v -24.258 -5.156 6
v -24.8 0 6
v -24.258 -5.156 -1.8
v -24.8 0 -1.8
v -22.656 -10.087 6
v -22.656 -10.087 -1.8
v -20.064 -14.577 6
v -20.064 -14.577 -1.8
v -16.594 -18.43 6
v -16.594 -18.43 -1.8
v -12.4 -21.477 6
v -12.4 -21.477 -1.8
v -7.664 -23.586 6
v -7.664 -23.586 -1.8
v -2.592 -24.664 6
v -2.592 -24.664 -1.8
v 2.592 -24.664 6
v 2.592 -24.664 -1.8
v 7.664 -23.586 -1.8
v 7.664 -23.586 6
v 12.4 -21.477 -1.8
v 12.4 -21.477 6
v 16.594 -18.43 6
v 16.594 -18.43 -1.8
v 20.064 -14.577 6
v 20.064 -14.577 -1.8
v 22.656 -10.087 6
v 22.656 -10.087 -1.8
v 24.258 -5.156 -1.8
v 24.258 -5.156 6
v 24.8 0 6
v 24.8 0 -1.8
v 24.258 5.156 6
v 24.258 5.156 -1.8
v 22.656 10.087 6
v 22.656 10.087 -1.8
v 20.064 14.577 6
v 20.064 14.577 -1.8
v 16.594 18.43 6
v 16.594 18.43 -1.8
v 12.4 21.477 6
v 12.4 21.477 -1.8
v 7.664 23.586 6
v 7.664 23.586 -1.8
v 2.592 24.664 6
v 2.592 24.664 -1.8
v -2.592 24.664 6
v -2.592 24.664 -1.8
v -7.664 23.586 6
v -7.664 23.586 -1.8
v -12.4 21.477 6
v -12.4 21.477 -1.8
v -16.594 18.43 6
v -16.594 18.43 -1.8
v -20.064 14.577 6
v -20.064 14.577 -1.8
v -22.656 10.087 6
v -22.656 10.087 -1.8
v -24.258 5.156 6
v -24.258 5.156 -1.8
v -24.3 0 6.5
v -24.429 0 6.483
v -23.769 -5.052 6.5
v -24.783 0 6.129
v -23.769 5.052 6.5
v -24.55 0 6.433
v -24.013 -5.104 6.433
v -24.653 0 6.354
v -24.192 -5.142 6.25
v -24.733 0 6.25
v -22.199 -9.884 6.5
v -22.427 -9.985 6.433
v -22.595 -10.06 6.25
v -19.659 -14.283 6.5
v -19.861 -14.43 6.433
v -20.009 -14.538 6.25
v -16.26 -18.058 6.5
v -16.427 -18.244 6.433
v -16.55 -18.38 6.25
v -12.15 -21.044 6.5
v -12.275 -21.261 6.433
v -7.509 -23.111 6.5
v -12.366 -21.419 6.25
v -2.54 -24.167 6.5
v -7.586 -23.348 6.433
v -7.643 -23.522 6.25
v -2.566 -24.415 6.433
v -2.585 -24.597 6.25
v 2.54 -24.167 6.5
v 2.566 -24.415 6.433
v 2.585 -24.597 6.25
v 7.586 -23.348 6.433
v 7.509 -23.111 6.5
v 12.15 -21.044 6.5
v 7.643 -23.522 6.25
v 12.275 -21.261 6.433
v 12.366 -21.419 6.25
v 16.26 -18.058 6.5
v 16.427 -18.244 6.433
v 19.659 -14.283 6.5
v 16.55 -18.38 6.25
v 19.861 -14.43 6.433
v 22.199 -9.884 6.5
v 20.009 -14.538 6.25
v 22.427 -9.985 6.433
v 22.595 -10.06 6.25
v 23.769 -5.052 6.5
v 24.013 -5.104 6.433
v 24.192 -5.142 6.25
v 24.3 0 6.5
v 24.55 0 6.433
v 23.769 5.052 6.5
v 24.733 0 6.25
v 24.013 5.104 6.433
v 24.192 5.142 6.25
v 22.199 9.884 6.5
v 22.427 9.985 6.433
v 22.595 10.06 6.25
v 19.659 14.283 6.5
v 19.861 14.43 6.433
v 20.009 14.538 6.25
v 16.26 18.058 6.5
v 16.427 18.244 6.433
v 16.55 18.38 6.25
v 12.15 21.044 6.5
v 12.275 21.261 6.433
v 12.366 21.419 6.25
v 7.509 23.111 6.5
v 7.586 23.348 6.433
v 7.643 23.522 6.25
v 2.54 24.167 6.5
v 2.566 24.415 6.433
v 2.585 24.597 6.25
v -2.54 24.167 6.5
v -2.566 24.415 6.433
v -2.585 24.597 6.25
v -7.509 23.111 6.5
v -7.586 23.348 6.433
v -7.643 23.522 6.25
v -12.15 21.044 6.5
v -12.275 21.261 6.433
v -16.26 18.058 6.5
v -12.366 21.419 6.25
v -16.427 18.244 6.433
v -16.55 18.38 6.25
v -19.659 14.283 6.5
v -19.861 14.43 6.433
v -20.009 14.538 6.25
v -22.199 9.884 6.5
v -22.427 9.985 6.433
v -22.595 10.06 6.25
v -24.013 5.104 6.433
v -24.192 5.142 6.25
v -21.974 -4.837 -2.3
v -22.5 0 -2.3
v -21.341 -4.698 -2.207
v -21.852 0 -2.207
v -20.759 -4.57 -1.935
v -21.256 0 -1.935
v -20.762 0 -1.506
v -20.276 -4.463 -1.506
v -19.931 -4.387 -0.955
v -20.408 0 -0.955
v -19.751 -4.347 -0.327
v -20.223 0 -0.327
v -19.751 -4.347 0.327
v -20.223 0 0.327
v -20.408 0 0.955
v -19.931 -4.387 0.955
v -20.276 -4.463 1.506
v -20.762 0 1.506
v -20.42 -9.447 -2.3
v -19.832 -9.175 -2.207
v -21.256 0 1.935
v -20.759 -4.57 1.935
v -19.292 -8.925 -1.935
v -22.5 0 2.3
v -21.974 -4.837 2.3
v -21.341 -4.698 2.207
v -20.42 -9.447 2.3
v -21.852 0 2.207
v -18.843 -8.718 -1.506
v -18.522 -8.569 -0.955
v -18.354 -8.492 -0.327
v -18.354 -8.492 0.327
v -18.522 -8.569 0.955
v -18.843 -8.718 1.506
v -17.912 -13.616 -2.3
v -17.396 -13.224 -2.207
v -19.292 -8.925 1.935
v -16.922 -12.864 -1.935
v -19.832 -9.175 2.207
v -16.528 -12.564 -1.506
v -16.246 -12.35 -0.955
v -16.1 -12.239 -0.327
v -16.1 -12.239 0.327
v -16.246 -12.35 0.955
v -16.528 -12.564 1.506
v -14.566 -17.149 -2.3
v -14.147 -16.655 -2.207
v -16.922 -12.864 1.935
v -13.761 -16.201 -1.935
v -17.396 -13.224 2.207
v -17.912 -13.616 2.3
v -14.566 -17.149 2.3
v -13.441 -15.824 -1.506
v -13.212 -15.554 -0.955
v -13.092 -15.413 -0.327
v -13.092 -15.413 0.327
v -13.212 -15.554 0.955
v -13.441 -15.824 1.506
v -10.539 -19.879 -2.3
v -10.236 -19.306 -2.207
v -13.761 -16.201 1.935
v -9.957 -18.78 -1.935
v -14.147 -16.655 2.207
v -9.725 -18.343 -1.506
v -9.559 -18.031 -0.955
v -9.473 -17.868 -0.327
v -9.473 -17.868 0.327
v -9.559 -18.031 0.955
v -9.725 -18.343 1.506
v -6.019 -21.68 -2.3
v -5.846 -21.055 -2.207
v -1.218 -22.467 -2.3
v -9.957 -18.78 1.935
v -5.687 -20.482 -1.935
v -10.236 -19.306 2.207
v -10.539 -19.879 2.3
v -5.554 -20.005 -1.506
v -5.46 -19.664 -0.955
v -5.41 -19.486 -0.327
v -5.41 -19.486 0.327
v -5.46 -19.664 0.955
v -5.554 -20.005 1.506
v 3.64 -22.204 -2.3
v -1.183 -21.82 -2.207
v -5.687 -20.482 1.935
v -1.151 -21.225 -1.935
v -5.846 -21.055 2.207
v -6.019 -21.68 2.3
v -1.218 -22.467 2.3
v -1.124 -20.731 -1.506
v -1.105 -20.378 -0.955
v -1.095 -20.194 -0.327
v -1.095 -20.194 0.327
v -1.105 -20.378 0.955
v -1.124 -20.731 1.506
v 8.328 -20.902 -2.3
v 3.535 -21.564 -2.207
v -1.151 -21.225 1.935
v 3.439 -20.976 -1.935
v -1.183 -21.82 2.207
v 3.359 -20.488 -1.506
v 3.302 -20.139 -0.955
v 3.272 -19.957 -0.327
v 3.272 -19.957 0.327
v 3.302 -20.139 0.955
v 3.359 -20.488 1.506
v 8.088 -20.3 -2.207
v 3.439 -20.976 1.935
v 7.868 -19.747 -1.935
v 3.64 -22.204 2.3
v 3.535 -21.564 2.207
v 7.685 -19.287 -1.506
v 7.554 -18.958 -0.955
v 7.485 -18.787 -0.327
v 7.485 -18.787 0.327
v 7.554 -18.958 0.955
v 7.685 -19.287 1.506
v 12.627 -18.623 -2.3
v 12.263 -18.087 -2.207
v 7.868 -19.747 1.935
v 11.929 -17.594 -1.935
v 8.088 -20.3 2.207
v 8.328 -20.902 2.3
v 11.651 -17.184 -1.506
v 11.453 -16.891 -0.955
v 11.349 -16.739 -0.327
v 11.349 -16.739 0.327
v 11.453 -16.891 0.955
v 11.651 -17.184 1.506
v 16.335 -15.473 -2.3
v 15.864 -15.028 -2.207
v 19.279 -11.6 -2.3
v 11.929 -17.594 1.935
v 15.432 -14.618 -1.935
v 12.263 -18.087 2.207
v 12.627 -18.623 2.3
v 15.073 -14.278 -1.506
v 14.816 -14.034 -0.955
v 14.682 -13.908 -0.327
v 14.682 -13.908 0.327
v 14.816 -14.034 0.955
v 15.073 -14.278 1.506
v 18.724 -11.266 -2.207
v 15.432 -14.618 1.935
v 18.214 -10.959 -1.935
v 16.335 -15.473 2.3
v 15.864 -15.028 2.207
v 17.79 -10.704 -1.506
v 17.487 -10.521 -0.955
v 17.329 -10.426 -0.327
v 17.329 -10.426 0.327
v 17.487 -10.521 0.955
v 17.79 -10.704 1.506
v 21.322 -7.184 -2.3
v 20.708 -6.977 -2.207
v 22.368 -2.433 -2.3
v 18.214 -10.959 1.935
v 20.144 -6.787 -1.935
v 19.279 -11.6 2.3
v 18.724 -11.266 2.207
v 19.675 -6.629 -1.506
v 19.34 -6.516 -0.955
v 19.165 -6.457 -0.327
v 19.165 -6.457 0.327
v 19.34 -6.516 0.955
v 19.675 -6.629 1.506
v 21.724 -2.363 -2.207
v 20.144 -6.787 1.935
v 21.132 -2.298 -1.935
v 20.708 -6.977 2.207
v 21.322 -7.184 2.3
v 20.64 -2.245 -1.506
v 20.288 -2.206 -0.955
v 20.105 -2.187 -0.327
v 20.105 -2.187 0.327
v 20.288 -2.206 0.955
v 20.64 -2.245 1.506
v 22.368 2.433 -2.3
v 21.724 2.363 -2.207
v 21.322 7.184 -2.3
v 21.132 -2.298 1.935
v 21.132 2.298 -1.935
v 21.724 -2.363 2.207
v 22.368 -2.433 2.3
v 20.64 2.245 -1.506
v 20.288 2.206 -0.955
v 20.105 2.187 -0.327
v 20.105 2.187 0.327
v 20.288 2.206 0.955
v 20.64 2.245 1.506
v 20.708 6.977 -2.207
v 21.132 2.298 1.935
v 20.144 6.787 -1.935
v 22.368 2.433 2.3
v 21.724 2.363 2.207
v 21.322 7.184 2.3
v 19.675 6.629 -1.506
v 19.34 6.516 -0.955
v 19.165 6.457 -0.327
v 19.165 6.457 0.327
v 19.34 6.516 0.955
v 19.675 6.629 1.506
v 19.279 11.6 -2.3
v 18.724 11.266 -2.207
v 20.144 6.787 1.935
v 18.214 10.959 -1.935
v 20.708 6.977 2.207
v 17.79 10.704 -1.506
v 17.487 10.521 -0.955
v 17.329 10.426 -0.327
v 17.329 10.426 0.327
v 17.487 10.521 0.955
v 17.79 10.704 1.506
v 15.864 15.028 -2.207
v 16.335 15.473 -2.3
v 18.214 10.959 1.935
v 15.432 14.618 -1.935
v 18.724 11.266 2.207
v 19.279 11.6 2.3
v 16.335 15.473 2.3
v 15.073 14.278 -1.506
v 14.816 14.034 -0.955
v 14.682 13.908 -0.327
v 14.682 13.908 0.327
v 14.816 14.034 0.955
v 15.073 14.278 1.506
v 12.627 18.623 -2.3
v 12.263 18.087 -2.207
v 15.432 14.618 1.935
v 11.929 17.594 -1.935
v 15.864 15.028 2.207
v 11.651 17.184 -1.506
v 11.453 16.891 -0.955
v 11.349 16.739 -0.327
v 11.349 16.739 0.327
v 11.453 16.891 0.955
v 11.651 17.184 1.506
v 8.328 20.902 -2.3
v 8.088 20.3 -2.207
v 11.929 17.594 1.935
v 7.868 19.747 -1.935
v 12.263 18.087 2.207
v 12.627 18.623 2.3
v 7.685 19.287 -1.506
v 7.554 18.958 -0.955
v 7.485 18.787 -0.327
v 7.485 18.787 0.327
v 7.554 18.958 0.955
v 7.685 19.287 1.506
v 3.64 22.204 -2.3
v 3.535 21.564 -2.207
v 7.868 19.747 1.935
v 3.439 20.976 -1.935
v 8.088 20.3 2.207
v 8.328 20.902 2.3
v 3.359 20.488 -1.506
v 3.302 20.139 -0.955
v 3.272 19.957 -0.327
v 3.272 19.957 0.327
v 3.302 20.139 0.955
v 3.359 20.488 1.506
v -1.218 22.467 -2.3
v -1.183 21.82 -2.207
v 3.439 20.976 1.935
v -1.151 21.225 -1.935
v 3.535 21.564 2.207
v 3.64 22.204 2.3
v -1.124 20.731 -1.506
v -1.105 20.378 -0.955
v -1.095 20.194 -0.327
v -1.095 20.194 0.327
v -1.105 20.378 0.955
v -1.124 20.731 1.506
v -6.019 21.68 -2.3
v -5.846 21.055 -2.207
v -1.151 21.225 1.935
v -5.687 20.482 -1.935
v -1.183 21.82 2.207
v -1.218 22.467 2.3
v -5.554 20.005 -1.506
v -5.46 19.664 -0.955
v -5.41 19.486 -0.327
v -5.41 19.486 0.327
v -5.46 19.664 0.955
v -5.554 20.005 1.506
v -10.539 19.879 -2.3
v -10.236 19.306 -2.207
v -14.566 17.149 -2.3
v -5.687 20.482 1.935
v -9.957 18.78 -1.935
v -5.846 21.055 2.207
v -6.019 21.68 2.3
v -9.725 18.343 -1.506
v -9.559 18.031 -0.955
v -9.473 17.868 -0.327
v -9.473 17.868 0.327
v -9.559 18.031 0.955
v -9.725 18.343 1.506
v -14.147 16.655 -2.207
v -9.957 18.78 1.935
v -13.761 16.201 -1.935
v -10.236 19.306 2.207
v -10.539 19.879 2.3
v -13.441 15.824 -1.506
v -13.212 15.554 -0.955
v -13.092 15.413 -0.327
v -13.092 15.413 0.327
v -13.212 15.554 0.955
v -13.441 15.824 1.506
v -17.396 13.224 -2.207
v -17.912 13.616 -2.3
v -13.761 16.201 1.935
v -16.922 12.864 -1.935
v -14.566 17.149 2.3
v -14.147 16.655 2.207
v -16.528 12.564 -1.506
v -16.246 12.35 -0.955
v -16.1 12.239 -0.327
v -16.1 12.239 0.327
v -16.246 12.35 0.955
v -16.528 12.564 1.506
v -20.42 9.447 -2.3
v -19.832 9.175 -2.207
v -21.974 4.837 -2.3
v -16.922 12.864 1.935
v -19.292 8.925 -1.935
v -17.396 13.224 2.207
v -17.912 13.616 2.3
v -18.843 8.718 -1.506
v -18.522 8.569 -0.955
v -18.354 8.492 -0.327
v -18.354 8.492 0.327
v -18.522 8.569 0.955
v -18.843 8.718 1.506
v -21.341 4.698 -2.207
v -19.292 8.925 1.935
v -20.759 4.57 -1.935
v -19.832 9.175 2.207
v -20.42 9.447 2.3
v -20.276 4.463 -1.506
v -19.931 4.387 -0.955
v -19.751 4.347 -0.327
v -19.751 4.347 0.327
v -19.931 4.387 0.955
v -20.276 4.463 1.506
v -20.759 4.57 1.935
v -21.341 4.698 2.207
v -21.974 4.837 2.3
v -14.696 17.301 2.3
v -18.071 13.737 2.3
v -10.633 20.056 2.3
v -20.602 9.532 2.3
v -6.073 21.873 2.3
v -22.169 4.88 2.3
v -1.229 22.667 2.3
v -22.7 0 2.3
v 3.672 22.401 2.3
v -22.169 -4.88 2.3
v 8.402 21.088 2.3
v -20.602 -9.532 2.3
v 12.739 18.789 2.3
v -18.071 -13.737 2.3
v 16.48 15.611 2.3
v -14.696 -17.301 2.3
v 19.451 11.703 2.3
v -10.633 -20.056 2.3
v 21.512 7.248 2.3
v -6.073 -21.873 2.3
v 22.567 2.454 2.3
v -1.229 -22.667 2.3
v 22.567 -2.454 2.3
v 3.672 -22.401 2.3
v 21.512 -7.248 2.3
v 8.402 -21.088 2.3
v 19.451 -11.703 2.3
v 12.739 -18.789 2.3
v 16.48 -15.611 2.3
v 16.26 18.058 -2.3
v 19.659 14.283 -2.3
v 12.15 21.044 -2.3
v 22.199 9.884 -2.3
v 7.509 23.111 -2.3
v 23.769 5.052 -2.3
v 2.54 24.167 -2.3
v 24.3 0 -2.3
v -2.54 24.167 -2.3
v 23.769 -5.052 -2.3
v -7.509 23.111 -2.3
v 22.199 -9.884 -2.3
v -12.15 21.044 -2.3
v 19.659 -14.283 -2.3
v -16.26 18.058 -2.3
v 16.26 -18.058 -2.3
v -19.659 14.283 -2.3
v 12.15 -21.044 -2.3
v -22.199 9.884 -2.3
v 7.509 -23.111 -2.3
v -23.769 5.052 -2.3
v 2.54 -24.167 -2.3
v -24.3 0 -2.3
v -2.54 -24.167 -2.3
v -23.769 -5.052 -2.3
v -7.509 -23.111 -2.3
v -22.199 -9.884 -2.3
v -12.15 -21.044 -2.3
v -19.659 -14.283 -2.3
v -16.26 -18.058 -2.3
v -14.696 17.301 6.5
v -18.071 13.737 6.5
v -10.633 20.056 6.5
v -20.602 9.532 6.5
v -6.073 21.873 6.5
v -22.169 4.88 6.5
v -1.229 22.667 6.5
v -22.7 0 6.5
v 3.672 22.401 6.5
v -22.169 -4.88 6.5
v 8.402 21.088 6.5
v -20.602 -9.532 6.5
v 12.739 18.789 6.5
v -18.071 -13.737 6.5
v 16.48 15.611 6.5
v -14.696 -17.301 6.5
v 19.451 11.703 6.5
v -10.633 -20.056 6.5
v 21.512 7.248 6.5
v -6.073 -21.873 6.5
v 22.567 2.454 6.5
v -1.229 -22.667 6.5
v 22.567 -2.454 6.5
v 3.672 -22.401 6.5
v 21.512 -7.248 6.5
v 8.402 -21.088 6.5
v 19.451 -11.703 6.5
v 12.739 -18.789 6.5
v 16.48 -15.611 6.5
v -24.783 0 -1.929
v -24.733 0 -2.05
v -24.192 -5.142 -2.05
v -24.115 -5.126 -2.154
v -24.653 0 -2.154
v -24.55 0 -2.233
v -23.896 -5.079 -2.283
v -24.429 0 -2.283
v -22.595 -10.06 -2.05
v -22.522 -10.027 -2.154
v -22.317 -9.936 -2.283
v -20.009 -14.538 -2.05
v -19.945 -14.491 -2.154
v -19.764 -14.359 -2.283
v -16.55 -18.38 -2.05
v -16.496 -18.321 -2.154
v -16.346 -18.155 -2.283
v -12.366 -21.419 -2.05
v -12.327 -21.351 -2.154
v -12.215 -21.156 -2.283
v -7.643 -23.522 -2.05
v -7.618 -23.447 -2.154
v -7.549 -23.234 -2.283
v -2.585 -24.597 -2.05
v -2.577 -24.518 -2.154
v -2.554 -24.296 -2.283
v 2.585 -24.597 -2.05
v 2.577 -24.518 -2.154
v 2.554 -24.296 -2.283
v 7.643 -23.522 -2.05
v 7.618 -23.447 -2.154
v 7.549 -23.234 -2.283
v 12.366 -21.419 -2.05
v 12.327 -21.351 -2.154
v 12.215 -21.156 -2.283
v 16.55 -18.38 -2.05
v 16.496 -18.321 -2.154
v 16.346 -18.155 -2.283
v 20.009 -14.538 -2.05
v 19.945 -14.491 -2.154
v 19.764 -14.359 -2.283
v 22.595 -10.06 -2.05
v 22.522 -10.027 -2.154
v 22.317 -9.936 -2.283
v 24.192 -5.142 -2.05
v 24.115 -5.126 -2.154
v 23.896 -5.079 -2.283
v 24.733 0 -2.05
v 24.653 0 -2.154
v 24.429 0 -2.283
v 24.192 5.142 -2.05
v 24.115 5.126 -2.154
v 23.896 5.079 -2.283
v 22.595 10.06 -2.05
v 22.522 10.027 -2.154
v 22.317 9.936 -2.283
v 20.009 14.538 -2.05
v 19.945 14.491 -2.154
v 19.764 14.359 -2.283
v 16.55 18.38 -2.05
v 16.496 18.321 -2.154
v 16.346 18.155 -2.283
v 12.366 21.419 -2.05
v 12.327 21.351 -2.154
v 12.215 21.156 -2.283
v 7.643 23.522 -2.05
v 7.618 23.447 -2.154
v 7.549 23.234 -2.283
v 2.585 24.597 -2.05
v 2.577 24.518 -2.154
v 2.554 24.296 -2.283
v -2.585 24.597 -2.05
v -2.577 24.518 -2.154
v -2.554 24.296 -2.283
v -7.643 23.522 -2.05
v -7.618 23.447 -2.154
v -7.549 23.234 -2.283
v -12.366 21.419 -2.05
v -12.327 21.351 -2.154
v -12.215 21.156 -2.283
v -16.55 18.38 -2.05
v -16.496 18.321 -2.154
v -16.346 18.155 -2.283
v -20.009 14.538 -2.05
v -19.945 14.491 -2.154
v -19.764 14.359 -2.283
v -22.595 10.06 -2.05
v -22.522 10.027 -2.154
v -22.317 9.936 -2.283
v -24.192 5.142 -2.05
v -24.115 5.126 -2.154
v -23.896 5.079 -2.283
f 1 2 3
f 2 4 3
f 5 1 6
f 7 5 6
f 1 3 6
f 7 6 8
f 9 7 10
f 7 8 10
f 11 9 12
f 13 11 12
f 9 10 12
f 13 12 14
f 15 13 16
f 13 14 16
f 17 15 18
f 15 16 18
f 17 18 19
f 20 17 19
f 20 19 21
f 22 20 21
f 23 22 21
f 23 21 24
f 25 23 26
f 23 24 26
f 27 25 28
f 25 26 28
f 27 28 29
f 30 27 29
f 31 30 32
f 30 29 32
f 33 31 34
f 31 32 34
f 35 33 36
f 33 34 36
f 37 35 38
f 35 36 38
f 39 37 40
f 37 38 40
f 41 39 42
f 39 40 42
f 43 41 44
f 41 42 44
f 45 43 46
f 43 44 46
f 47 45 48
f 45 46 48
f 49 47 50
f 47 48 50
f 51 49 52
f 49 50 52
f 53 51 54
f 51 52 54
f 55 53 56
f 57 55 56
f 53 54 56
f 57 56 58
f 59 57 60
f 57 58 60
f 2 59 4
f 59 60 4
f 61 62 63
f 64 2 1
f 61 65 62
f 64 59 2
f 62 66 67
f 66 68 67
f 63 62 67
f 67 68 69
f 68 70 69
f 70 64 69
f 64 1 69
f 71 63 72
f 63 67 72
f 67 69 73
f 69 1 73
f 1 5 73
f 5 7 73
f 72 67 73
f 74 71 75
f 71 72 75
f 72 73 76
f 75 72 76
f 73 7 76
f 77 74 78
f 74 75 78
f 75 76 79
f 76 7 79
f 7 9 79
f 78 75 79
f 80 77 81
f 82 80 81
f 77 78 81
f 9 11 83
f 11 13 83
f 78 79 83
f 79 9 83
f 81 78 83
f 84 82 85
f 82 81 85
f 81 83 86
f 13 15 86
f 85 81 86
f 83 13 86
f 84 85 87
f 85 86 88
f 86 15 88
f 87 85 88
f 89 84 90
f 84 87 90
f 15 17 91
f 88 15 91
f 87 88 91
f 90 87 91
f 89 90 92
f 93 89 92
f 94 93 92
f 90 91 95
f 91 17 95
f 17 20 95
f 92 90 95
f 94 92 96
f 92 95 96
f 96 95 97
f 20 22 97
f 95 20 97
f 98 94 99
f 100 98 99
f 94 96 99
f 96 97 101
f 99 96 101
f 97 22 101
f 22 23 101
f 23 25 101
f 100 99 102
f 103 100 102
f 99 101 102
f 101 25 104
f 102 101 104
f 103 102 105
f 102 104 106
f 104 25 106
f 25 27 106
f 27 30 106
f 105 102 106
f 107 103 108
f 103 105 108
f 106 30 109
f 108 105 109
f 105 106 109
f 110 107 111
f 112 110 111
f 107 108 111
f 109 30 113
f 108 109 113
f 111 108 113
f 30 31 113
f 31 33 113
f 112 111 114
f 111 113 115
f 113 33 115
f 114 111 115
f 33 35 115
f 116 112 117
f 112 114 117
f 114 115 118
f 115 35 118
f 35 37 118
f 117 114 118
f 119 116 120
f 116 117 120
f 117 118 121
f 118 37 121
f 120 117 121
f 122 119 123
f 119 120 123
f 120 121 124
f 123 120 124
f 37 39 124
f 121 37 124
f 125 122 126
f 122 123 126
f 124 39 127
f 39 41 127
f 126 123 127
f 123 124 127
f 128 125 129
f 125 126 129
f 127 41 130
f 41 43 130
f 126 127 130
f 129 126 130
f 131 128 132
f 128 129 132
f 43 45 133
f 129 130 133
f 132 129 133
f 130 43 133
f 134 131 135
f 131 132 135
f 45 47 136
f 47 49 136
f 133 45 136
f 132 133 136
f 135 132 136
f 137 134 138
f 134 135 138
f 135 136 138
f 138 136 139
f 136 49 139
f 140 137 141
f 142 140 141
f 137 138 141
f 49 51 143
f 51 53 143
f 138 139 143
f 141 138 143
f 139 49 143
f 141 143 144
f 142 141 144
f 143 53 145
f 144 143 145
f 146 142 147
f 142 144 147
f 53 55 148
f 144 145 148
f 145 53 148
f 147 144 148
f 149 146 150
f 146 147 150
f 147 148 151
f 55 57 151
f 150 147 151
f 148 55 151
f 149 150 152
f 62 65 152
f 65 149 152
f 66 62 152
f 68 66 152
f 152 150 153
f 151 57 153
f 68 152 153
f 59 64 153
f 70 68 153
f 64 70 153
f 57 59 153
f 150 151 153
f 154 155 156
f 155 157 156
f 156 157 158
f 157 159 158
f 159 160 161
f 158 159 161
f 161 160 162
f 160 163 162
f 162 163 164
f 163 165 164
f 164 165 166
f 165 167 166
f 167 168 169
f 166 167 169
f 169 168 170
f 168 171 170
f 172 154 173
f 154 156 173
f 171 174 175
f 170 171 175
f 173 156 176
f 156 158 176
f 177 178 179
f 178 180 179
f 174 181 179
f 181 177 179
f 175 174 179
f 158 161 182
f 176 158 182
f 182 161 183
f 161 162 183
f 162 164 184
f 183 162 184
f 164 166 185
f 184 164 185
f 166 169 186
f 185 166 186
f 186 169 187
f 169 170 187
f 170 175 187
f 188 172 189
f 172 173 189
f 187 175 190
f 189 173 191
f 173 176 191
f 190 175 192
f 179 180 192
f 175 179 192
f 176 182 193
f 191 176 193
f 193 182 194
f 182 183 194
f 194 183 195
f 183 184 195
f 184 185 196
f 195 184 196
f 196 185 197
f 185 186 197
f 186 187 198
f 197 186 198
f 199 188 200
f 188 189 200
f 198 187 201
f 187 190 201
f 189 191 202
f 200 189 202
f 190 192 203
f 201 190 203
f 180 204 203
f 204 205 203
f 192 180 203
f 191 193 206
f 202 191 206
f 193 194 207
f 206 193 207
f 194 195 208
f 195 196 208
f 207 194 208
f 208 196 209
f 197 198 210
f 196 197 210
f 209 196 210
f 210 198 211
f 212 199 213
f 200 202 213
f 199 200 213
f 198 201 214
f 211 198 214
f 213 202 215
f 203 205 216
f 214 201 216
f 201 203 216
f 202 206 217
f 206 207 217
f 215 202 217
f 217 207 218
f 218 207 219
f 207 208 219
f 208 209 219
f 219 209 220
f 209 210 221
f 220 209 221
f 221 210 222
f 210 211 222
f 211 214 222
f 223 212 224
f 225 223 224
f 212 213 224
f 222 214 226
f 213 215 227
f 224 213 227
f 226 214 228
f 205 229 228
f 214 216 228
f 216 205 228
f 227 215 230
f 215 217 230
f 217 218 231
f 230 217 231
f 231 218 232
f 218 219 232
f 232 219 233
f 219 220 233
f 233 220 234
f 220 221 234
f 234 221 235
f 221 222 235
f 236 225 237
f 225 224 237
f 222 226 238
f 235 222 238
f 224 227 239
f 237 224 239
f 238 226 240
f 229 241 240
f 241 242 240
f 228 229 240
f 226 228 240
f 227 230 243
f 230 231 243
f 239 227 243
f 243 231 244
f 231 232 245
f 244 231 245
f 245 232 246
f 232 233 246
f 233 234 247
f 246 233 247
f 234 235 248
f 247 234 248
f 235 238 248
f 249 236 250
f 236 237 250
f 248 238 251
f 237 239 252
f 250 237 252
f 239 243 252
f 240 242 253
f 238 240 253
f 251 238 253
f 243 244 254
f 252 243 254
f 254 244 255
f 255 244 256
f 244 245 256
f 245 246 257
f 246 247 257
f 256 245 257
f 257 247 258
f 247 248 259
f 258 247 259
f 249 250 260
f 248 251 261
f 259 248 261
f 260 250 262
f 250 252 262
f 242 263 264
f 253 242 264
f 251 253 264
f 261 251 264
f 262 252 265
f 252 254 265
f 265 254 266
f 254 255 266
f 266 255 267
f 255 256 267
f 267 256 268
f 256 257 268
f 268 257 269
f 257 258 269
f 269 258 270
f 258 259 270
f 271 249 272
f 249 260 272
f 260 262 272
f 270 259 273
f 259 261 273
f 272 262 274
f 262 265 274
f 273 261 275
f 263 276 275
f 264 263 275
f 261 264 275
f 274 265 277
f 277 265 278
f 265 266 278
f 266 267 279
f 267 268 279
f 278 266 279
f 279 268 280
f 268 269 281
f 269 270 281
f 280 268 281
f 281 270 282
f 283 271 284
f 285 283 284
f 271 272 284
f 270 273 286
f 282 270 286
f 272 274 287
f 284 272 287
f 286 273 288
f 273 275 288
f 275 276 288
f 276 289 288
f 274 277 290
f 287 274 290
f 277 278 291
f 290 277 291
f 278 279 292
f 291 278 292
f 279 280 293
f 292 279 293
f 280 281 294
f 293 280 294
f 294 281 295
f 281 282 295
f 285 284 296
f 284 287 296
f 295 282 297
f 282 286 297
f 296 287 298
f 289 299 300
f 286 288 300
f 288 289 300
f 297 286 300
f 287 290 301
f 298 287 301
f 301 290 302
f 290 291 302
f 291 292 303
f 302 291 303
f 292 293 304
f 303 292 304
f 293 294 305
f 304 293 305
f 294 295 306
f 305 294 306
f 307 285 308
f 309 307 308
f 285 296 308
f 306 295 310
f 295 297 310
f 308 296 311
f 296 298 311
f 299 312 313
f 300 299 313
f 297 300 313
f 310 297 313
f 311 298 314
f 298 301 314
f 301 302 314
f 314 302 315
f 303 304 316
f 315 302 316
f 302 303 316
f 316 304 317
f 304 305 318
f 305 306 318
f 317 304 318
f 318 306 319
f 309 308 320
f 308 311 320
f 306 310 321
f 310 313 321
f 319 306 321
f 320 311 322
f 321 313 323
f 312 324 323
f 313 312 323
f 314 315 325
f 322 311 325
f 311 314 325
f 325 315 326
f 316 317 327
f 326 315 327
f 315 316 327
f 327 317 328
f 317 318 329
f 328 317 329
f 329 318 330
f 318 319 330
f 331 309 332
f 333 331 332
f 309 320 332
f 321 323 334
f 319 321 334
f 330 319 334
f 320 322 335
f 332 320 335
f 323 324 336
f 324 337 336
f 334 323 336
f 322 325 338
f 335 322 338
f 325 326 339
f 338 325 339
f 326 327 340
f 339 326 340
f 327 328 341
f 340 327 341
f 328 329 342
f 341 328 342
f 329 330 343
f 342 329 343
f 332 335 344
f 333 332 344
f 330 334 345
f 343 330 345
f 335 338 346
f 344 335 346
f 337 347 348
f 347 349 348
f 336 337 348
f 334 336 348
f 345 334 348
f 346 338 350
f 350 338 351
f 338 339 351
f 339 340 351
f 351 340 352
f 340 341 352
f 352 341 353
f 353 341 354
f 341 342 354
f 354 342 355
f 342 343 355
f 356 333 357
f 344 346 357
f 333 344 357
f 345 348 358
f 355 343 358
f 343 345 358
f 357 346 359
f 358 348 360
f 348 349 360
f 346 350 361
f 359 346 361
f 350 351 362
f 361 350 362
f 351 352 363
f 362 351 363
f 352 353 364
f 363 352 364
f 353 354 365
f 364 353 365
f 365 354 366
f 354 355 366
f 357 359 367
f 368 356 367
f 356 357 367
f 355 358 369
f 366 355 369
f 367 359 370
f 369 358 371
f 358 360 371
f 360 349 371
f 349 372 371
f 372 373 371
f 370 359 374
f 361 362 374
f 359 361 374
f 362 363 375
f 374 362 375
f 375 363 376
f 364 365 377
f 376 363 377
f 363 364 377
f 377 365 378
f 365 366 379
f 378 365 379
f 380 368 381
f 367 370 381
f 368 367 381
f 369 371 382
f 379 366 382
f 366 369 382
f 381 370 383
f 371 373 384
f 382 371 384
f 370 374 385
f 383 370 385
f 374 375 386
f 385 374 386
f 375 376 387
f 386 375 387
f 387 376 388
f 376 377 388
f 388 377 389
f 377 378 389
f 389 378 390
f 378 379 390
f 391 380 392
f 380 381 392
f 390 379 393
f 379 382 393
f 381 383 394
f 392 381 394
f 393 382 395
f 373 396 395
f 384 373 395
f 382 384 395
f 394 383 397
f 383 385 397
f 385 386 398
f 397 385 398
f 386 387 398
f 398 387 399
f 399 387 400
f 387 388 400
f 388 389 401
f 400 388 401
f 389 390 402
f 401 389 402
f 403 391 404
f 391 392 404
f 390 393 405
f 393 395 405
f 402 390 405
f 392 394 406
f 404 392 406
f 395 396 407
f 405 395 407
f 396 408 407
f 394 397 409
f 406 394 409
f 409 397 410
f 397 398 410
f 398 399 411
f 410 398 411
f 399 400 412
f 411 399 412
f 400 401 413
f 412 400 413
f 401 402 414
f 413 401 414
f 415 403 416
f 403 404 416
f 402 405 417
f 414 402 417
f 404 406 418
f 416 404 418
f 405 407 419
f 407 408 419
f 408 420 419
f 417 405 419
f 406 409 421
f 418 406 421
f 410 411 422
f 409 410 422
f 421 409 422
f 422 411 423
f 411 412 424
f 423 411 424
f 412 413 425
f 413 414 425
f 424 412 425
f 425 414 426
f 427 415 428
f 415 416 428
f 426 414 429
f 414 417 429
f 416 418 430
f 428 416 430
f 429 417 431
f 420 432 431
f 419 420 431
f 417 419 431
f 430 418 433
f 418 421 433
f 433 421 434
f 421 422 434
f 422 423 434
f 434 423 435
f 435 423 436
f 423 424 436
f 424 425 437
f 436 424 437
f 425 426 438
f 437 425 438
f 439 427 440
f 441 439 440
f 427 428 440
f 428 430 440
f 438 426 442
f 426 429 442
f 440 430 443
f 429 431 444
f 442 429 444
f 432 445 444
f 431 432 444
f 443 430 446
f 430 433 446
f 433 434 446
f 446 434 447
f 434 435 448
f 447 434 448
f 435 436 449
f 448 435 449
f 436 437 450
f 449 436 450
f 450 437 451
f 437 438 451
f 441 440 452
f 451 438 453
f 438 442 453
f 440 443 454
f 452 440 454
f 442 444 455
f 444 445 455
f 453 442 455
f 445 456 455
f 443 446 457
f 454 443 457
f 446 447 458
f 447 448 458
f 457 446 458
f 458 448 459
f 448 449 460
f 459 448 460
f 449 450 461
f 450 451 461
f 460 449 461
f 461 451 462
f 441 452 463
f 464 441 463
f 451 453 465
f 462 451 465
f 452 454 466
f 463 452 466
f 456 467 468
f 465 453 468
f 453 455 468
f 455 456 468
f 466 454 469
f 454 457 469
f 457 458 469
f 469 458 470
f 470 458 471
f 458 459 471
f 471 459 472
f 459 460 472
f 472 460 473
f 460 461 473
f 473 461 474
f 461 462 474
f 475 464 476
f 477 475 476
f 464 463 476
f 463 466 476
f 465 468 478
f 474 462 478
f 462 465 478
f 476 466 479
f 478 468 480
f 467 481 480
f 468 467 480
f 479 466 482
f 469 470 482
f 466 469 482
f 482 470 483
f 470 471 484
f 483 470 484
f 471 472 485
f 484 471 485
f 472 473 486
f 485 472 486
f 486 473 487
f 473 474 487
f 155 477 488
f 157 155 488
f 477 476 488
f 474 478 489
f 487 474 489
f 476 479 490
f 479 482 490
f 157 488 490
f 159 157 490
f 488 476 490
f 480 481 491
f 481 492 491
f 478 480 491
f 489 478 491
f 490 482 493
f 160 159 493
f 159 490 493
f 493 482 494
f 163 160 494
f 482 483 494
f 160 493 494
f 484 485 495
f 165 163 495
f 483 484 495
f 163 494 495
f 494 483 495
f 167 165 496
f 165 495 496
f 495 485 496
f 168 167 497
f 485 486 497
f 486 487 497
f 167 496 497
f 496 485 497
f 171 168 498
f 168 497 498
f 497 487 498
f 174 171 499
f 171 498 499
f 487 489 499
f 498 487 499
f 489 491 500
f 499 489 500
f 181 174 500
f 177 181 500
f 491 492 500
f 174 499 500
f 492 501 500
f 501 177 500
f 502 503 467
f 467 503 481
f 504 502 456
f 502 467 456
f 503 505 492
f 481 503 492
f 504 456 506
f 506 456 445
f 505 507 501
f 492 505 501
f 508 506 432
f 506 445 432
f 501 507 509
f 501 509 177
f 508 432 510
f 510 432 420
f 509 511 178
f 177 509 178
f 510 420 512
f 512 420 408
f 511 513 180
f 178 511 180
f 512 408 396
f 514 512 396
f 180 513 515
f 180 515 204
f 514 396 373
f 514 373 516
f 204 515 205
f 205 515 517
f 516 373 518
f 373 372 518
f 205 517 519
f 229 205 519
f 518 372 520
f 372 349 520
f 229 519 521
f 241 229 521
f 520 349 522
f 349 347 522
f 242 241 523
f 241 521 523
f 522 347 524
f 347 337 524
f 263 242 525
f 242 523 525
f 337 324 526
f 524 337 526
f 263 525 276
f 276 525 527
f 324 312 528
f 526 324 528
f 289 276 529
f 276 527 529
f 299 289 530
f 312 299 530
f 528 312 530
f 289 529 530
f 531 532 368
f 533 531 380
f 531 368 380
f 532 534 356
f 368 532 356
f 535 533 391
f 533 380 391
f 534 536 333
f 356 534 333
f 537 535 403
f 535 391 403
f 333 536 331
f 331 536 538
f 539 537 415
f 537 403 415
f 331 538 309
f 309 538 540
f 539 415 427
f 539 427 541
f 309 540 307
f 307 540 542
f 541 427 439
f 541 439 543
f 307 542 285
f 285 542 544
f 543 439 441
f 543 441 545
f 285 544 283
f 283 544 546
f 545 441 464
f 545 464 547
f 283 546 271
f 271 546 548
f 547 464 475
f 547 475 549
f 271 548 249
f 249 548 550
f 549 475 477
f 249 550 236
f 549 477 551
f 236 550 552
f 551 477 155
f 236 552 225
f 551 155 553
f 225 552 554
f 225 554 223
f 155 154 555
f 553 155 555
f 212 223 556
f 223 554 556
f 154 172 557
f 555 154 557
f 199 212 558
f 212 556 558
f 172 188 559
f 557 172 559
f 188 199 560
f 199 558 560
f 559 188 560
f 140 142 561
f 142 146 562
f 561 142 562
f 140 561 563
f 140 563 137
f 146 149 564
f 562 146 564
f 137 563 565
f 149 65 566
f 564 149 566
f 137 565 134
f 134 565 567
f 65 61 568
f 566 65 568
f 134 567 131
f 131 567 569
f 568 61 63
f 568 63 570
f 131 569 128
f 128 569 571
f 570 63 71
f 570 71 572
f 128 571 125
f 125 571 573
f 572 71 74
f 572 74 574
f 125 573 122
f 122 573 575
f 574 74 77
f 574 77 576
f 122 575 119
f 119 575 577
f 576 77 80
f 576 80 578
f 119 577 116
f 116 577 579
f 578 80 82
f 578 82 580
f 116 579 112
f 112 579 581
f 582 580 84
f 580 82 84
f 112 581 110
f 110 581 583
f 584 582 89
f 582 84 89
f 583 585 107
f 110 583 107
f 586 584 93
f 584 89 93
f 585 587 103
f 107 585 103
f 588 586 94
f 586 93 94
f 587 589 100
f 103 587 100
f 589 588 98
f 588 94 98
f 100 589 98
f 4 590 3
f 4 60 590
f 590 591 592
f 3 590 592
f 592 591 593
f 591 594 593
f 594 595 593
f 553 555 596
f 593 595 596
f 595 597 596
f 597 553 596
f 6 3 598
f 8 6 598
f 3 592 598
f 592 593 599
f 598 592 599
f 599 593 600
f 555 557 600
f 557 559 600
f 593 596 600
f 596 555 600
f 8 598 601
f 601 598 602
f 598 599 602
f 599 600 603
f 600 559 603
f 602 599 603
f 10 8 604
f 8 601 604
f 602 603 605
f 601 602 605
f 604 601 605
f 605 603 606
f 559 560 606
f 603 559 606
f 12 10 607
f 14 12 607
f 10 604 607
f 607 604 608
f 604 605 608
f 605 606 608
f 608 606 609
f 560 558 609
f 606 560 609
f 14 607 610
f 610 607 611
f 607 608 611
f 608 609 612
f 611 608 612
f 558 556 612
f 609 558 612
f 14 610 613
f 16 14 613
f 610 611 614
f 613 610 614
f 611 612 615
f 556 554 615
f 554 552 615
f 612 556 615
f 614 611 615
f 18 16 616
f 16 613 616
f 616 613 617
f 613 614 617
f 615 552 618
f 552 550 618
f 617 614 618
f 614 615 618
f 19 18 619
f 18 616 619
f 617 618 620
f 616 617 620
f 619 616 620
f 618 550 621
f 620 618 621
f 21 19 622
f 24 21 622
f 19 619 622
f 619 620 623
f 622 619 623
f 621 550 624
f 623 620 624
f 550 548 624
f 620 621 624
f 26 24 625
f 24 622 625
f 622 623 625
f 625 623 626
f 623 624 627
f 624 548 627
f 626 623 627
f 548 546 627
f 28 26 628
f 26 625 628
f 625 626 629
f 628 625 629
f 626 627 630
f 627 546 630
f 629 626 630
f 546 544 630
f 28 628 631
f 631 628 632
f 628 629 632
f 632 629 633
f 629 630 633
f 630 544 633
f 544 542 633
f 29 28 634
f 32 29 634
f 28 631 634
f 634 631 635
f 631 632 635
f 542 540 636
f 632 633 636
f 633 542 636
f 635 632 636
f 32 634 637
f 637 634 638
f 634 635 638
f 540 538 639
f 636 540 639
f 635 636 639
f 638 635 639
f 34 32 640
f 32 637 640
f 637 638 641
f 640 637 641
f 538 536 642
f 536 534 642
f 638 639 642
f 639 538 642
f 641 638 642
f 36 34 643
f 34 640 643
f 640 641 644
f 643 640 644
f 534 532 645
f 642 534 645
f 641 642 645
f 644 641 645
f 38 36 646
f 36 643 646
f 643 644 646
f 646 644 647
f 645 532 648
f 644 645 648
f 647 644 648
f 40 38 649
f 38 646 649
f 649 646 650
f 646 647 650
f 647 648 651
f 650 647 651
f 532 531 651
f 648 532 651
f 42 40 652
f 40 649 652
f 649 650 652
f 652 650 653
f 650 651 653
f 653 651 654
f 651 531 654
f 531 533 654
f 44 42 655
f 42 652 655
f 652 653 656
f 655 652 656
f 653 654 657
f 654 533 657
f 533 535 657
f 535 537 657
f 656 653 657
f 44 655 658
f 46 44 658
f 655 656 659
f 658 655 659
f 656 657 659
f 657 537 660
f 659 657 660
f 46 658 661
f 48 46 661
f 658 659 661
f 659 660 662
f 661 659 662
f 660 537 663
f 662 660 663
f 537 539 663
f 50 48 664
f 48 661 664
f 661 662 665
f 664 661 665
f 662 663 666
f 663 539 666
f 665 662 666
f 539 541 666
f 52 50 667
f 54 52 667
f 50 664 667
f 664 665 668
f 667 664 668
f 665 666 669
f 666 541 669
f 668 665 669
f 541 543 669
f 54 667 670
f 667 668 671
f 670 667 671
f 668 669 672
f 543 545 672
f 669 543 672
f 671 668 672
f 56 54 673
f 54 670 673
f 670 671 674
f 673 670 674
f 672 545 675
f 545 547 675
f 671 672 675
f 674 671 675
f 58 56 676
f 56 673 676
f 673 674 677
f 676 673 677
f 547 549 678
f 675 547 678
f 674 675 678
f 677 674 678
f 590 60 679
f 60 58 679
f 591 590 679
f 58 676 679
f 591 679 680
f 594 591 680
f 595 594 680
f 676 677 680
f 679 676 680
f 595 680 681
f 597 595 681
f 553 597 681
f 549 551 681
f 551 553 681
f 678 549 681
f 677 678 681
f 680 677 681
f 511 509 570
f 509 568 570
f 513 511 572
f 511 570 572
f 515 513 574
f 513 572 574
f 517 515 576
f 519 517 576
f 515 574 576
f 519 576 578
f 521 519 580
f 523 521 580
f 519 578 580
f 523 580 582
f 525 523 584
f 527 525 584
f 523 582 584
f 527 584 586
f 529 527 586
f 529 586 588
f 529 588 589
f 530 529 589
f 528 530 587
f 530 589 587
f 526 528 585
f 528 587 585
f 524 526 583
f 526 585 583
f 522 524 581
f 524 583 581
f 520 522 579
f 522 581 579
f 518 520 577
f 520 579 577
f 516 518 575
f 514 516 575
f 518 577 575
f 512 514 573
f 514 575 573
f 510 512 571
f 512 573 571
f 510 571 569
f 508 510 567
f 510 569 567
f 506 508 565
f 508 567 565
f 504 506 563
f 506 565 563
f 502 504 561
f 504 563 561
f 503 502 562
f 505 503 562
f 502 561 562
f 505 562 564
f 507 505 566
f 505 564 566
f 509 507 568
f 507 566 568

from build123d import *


with BuildPart() as f2:
    # F1 (on Front) → F2 (revolve)
    with BuildSketch(Plane.XZ):
        with BuildLine():
            Line((-24.2999375641, -2.3), (-22.4999375641, -2.3))
            ThreePointArc((-22.4999375641, -2.3), (-20.1999375641, 0), (-22.4999375641, 2.3))
            Line((-22.4999375641, 2.3), (-22.7000582963, 2.3))
            Line((-22.7000582963, 2.3), (-22.7000582963, 6.5))
            Line((-22.7000582963, 6.5), (-24.2999375641, 6.5))
            ThreePointArc((-24.2999375641, 6.5), (-24.6534909547, 6.3535533906), (-24.7999375641, 6))
            Line((-24.7999375641, 6), (-24.7999375641, 2))
            Line((-24.7999375641, 2), (-24.7999375641, -1.8))
            ThreePointArc((-24.7999375641, -1.8), (-24.6534909547, -2.1535533906), (-24.2999375641, -2.3))
        make_face()
    revolve(axis=Axis((0, 0, 0), (0, 0, 1)))


solid = f2.part
